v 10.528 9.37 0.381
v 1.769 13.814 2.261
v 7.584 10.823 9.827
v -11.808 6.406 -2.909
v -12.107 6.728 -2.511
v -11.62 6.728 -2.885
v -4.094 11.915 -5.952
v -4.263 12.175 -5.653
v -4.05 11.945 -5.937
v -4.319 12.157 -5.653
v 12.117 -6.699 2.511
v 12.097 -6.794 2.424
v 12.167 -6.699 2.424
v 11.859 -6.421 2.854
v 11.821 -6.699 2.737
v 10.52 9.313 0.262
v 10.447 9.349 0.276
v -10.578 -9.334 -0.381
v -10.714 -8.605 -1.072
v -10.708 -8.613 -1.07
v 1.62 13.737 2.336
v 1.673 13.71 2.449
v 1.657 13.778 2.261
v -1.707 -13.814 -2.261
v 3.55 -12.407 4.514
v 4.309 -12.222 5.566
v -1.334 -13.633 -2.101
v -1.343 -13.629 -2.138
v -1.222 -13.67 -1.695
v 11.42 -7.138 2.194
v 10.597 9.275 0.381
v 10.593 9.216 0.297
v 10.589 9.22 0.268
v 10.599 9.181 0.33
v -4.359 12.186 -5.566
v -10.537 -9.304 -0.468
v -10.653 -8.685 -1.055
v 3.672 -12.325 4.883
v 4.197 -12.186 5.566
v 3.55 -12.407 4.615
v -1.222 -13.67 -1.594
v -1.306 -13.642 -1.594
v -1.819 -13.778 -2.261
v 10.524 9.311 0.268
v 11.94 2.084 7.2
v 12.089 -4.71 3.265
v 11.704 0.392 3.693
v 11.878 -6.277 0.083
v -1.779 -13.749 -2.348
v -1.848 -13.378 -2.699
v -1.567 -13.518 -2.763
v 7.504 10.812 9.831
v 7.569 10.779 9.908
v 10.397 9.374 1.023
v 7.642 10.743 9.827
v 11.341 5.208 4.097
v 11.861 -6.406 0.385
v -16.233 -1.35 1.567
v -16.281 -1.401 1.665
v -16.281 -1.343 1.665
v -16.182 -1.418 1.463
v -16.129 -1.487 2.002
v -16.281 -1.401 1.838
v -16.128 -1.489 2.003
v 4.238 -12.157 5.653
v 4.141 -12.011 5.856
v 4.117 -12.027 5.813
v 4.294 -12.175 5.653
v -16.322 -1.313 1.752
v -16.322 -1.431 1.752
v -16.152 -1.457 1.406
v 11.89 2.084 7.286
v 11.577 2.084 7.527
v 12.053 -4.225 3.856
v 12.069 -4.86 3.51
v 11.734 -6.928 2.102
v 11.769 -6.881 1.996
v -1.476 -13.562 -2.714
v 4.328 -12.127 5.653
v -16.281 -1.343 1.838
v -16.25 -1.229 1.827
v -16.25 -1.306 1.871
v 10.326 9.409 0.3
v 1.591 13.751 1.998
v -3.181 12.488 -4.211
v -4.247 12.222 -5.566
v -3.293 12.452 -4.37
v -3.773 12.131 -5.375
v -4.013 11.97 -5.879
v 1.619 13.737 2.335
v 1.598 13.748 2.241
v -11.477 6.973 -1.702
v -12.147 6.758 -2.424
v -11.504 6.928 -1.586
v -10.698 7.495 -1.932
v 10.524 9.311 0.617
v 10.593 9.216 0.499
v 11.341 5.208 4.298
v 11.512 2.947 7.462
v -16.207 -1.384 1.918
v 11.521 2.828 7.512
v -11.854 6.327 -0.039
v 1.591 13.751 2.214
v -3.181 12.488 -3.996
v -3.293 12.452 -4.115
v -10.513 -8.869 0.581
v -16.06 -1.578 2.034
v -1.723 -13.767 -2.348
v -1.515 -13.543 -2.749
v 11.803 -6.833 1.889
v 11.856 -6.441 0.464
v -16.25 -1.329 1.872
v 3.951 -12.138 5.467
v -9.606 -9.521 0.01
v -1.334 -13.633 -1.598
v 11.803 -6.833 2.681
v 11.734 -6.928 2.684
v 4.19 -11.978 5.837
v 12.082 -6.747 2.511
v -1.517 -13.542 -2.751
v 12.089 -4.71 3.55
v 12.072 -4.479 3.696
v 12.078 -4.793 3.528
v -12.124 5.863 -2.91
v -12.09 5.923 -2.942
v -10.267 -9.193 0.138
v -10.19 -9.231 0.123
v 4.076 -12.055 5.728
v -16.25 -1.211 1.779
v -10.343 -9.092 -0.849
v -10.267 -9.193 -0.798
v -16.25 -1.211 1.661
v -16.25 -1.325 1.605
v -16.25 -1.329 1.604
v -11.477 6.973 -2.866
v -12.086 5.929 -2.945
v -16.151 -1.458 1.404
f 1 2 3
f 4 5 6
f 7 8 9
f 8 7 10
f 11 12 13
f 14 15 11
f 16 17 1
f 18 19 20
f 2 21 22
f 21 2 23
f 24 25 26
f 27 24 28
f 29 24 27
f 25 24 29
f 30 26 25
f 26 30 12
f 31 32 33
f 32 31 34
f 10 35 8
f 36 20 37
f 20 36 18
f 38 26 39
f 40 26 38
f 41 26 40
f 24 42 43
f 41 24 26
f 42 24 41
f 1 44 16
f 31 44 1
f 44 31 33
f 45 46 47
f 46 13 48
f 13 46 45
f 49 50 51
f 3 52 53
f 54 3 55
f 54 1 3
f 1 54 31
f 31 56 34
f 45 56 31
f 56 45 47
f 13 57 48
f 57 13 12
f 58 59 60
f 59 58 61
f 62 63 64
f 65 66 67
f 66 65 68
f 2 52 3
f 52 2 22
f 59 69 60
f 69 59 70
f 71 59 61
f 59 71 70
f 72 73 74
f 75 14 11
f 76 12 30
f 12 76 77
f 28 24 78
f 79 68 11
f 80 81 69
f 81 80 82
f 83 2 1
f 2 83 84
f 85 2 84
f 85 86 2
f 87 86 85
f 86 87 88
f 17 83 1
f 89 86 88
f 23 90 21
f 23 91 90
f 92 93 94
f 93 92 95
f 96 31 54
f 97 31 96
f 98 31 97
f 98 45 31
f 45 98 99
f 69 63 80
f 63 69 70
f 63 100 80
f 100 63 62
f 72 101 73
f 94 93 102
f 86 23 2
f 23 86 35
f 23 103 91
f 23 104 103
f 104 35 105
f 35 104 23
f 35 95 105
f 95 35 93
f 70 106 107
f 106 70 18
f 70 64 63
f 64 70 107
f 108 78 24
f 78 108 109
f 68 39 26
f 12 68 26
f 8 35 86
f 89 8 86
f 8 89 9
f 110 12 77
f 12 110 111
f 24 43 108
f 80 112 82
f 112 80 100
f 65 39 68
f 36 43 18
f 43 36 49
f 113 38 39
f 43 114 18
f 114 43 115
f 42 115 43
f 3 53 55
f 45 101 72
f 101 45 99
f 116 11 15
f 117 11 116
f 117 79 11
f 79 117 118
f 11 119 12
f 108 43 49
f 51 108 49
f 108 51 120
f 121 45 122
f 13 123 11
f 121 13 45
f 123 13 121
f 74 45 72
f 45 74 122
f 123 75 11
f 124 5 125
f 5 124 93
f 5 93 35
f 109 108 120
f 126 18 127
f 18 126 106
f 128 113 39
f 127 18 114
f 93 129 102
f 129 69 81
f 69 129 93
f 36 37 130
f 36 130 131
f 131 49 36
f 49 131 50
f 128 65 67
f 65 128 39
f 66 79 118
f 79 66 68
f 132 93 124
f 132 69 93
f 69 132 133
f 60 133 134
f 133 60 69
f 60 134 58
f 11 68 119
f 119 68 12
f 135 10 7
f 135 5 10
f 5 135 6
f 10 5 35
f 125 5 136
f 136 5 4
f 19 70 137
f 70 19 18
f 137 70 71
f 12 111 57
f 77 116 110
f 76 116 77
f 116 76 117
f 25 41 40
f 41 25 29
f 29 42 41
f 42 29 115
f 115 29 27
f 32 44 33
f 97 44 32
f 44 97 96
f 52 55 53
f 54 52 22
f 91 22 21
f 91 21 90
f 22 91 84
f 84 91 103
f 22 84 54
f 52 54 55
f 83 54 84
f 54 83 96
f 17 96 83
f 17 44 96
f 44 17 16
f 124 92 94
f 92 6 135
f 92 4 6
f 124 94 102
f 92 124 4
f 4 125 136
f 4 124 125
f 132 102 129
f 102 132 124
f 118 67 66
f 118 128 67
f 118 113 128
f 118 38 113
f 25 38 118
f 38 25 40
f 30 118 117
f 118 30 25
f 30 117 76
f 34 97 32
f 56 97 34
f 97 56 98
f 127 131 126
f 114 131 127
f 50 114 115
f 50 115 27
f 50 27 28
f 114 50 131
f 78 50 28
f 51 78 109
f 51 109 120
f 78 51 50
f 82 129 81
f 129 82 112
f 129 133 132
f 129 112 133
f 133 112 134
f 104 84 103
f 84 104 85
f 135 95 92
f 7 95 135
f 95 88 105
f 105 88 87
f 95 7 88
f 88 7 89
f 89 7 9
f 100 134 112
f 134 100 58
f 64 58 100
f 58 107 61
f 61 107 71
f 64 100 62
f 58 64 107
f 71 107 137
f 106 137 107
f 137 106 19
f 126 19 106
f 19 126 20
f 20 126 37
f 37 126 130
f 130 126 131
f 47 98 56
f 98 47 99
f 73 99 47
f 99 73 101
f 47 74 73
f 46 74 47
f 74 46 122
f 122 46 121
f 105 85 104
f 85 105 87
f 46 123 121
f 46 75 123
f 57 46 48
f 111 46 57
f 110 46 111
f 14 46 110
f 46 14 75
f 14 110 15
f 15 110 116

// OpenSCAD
// Auto-generated OpenSCAD file

    inner_points = 10*[[-0.12531678041950284, -1.3574519535518534, -0.3000260109199145], [-0.36746057341550314, 0.8957867730802842, 1.0108452987700864], [0.3981645779138779, -0.8876613539251546, -1.0108452987700864], [0.15602078491787758, 1.3655773727069829, 0.3000260109199145], [1.1703376344459069, -0.6833157024764185, 0.39628853077487575], [1.0778469356862532, 0.17734490632952513, 0.8969968161993667], [-1.0471429311878786, -0.16921948717439553, -0.8969968161993667], [-1.1396336299475323, 0.6914411216315481, -0.39628853077487575], [-0.2463928887078073, -0.7090848095102253, 1.1774700504213524], [1.1240990998859461, 0.520842947907666, -0.6834790050293927], [-1.0933950953875715, -0.5127175287525364, 0.6834790050293927], [0.277096893206182, 0.717210228665355, -1.1774700504213524], [0.3519124137141851, -1.2311593955032956, 0.5696305224586731], [0.20225931947783818, 0.16141872232289847, 1.379793546724183], [1.198923043974558, -0.47102223771210283, -0.5804992451419002], [1.0492699497382112, 0.9215558801140912, 0.2296637791236098], [-1.0185659452398366, -0.9134304609589615, -0.2296637791236098], [-1.1682190394761833, 0.4791476568672325, 0.5804992451419002], [-0.17155531497946344, -0.15329330316776887, -1.379793546724183], [-0.32120840921581034, 1.239284814658425, -0.5696305224586731], [0.7452968962209774, -0.6746243016514798, 1.3014210240601998], [-1.6168689194414103, -0.1269845502290076, -0.0762480675498447], [0.8250174408462159, -0.08256874217359109, -1.4226978450891705]];

    outer_points = 10*[[-0.4278051408840869, 1.2127161463312635, -0.5566217759152233], [-0.17380580954418245, -1.3719247336384077, -0.2261405699168037], [0.17380580954418245, 1.3719247336384077, 0.2261405699168037], [0.4278051408840869, -1.2127161463312635, 0.5566217759152233], [0.9893779464124436, 0.49362248371798856, -0.8608098595411191], [1.0863970578645408, -0.49362248371798856, -0.7345772714927785], [-1.0863970578645408, 0.49362248371798856, 0.7345772714927785], [-0.9893779464124436, -0.49362248371798856, 0.8608098595411191], [-0.3910812087944938, -0.20840674643547916, -1.3293410426713064], [1.1839567074308435, 0.20840674643547916, 0.7199573838305398], [-1.1839567074308435, -0.20840674643547916, -0.7199573838305398], [0.3910812087944938, 0.20840674643547916, 1.3293410426713064], [0.07624615997787965, 0.6698955034849399, -1.2283940854065145], [0.233226379865687, -0.9275004090487542, -1.0241454674564356], [1.0496731257749474, 0.9275004090487542, 0.038141995263304695], [1.2066533456627548, -0.6698955034849399, 0.24239061321338368], [-1.2066533456627548, 0.6698955034849399, -0.24239061321338368], [-1.0496731257749474, -0.9275004090487542, -0.038141995263304695], [-0.233226379865687, 0.9275004090487542, 1.0241454674564356], [-0.07624615997787965, -0.6698955034849399, 1.2283940854065145], [0.5871367924966472, -0.13720650167138226, -1.5243283937879823], [-1.624077516255638, -0.13720650167138226, 0.17515389348918065], [0.7552912676752325, 1.0728158516403192, 0.9827174256902117]];

    // Convex hull for inner set (I)
    module inner_hull() {
        hull() {
            for (p = inner_points) {
                translate(p) sphere(r=0.1);
            }
        }
    }

    // Convex hull for outer set (O) minus inner hull (O \ I)
    module outer_minus_inner() {
        difference() {
            hull() {
                for (p = outer_points) {
                    translate(p) sphere(r=0.1);
                }
            }
            inner_hull(); // Subtract inner hull
        }
    }

    // Convex hull for outer set (O) minus all translated inner hulls
    module outer_minus_AllTranslationInner() {
        difference() {
            hull() {
                for (p = outer_points) {
                    translate(p) sphere(r=0.1);
                }
            }
            hull() {
                translate([0,0,50]) inner_hull();
                translate([0,0,-50]) inner_hull();
            }; // Subtract translated inner hulls
        }
    }

    // Difference between outer_minus_inner and outer_minus_AllTranslationInner
    module outer_minus_inner_diff() {
        difference() {
            // Outer minus inner
            difference() {
                hull() {
                    for (p = outer_points) {
                        translate(p) sphere(r=0.1);
                    }
                }
                inner_hull();
            }

            // Subtract Outer minus AllTranslationInner
            difference() {
                hull() {
                    for (p = outer_points) {
                        translate(p) sphere(r=0.1);
                    }
                }
                hull() {
                    translate([0,0,50]) inner_hull();
                    translate([0,0,-50]) inner_hull();
                };
            }
        }
    }

    // Rendering all with colors applied
    color([0, 1, 0, 1]) outer_minus_AllTranslationInner(); // Opaque green
    
